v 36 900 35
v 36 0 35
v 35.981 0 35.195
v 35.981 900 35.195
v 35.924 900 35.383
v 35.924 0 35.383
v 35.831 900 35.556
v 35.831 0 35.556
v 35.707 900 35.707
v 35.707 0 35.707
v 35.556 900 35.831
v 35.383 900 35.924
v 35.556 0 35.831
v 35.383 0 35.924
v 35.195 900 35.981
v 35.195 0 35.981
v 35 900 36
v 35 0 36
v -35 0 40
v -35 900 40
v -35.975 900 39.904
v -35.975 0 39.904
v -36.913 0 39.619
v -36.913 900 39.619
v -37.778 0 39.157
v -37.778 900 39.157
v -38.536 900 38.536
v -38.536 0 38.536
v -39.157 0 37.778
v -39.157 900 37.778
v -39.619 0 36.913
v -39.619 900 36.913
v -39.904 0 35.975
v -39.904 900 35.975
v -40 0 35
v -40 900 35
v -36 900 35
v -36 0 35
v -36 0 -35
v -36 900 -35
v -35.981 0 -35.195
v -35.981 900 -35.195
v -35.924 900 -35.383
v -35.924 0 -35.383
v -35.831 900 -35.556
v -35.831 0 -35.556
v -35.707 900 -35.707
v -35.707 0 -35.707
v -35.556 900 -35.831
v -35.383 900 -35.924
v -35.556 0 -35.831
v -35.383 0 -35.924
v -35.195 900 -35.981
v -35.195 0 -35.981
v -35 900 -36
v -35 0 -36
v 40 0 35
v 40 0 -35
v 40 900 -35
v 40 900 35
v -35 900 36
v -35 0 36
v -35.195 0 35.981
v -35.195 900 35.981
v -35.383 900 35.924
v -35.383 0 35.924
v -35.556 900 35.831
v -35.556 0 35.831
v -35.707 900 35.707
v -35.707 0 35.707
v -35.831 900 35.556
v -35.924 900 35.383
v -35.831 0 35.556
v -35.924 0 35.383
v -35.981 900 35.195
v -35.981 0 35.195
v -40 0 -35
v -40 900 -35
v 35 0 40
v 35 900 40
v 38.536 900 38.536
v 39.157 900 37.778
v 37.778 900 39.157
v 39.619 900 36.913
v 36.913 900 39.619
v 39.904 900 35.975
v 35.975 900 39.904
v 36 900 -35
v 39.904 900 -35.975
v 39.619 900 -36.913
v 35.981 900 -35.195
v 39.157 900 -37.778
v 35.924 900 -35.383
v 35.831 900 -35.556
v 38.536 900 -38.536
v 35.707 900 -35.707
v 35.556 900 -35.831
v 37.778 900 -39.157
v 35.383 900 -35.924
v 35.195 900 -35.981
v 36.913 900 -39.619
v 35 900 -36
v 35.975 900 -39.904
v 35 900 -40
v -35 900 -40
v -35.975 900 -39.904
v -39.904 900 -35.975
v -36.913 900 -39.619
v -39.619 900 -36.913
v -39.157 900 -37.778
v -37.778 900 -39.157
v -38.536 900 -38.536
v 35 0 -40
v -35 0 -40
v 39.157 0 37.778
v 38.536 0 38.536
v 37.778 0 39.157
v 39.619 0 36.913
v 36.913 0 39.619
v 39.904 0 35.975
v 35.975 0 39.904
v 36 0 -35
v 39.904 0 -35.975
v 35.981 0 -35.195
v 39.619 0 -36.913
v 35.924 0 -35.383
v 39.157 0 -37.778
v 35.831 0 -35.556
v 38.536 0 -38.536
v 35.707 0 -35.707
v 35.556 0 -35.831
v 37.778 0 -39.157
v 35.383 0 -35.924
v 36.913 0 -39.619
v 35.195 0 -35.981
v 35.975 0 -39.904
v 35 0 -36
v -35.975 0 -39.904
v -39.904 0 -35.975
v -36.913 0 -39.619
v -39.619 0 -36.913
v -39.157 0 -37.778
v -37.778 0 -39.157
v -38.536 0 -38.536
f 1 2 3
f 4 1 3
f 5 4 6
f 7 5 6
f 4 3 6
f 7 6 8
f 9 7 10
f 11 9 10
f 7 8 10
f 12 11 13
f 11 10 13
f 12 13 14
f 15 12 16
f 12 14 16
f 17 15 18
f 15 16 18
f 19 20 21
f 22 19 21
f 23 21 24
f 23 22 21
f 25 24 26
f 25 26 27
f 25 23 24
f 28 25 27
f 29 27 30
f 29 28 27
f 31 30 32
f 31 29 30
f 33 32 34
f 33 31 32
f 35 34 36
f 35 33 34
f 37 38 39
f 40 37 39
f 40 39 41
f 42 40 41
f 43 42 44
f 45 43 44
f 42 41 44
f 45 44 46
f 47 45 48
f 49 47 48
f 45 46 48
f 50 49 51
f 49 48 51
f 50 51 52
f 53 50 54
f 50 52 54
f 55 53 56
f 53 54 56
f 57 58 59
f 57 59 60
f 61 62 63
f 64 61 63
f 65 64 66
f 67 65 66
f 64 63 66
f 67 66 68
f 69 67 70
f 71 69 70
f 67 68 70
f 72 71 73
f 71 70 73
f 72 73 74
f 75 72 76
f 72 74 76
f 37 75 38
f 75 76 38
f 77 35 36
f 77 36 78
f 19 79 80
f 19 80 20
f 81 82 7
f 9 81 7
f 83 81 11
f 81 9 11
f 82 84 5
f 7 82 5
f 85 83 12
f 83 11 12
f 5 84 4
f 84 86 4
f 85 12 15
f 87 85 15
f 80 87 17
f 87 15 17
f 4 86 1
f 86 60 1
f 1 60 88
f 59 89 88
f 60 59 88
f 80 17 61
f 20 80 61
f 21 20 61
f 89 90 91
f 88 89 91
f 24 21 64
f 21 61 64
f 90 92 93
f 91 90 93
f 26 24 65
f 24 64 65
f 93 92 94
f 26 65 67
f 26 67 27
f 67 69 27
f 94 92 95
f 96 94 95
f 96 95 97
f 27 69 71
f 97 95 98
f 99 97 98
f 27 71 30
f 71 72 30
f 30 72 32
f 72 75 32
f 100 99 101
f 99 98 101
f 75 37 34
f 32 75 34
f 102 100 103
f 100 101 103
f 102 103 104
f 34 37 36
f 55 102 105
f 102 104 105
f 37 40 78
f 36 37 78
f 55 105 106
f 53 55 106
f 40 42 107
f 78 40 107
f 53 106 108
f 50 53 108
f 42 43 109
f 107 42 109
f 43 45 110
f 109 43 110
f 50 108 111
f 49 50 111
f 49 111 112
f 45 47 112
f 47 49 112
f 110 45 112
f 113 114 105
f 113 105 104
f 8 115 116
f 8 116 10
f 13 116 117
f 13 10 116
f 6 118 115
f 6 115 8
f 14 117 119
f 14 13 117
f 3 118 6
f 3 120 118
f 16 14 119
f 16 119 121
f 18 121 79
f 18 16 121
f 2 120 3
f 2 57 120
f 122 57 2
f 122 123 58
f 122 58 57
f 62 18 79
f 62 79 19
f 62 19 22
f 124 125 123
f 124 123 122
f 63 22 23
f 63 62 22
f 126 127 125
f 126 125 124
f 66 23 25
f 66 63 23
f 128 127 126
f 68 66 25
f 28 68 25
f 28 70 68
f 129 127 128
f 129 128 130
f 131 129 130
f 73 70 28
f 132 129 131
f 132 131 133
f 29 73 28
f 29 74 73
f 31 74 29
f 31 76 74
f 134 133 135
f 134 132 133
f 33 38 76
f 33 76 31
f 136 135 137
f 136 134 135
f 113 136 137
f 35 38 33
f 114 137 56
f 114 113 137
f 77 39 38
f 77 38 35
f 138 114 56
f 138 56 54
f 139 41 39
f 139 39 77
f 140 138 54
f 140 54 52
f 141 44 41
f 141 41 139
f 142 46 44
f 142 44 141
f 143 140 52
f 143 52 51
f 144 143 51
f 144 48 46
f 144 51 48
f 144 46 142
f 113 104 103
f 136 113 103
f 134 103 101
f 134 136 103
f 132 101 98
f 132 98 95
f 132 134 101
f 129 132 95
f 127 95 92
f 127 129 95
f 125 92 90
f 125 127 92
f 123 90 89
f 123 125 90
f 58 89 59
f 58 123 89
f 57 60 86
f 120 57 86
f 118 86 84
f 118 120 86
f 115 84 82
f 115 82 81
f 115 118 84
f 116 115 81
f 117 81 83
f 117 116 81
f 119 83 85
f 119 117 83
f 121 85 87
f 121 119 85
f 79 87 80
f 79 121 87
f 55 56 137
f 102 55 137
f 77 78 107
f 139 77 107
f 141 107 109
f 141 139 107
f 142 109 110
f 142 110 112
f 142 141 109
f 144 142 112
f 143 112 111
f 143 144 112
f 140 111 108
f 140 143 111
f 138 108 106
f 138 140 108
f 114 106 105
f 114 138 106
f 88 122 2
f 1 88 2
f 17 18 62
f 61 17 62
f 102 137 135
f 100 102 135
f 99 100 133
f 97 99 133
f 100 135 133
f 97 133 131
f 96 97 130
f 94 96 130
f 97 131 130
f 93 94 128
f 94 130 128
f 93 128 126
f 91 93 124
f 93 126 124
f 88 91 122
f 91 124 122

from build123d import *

# Parameters (mm, degrees)
EXTRUDE_1_DEPTH = 900


with BuildPart() as part:
    # Эскиз1 → Вытянуть-Тонкостенный1 (new body)
    with BuildSketch(Plane(origin=(0, 0, 0), x_dir=(1, 0, 0), z_dir=(0, 1, 0))):
        with BuildLine():
            Line((-35, 40), (35, 40))
            ThreePointArc((35, 40), (38.535533906, 38.535533906), (40, 35))
            Line((40, 35), (40, -35))
            ThreePointArc((40, -35), (38.535533906, -38.535533906), (35, -40))
            Line((35, -40), (-35, -40))
            ThreePointArc((-35, -40), (-38.535533906, -38.535533906), (-40, -35))
            Line((-40, -35), (-40, 35))
            ThreePointArc((-40, 35), (-38.535533906, 38.535533906), (-35, 40))
        make_face()
        with BuildLine():
            Line((-35, 36), (35, 36))
            ThreePointArc((35, 36), (35.707106781, 35.707106781), (36, 35))
            Line((36, 35), (36, -35))
            ThreePointArc((36, -35), (35.707106781, -35.707106781), (35, -36))
            Line((35, -36), (-35, -36))
            ThreePointArc((-35, -36), (-35.707106781, -35.707106781), (-36, -35))
            Line((-36, -35), (-36, 35))
            ThreePointArc((-36, 35), (-35.707106781, 35.707106781), (-35, 36))
        make_face(mode=Mode.SUBTRACT)
    extrude(amount=EXTRUDE_1_DEPTH)


solid = part.part
